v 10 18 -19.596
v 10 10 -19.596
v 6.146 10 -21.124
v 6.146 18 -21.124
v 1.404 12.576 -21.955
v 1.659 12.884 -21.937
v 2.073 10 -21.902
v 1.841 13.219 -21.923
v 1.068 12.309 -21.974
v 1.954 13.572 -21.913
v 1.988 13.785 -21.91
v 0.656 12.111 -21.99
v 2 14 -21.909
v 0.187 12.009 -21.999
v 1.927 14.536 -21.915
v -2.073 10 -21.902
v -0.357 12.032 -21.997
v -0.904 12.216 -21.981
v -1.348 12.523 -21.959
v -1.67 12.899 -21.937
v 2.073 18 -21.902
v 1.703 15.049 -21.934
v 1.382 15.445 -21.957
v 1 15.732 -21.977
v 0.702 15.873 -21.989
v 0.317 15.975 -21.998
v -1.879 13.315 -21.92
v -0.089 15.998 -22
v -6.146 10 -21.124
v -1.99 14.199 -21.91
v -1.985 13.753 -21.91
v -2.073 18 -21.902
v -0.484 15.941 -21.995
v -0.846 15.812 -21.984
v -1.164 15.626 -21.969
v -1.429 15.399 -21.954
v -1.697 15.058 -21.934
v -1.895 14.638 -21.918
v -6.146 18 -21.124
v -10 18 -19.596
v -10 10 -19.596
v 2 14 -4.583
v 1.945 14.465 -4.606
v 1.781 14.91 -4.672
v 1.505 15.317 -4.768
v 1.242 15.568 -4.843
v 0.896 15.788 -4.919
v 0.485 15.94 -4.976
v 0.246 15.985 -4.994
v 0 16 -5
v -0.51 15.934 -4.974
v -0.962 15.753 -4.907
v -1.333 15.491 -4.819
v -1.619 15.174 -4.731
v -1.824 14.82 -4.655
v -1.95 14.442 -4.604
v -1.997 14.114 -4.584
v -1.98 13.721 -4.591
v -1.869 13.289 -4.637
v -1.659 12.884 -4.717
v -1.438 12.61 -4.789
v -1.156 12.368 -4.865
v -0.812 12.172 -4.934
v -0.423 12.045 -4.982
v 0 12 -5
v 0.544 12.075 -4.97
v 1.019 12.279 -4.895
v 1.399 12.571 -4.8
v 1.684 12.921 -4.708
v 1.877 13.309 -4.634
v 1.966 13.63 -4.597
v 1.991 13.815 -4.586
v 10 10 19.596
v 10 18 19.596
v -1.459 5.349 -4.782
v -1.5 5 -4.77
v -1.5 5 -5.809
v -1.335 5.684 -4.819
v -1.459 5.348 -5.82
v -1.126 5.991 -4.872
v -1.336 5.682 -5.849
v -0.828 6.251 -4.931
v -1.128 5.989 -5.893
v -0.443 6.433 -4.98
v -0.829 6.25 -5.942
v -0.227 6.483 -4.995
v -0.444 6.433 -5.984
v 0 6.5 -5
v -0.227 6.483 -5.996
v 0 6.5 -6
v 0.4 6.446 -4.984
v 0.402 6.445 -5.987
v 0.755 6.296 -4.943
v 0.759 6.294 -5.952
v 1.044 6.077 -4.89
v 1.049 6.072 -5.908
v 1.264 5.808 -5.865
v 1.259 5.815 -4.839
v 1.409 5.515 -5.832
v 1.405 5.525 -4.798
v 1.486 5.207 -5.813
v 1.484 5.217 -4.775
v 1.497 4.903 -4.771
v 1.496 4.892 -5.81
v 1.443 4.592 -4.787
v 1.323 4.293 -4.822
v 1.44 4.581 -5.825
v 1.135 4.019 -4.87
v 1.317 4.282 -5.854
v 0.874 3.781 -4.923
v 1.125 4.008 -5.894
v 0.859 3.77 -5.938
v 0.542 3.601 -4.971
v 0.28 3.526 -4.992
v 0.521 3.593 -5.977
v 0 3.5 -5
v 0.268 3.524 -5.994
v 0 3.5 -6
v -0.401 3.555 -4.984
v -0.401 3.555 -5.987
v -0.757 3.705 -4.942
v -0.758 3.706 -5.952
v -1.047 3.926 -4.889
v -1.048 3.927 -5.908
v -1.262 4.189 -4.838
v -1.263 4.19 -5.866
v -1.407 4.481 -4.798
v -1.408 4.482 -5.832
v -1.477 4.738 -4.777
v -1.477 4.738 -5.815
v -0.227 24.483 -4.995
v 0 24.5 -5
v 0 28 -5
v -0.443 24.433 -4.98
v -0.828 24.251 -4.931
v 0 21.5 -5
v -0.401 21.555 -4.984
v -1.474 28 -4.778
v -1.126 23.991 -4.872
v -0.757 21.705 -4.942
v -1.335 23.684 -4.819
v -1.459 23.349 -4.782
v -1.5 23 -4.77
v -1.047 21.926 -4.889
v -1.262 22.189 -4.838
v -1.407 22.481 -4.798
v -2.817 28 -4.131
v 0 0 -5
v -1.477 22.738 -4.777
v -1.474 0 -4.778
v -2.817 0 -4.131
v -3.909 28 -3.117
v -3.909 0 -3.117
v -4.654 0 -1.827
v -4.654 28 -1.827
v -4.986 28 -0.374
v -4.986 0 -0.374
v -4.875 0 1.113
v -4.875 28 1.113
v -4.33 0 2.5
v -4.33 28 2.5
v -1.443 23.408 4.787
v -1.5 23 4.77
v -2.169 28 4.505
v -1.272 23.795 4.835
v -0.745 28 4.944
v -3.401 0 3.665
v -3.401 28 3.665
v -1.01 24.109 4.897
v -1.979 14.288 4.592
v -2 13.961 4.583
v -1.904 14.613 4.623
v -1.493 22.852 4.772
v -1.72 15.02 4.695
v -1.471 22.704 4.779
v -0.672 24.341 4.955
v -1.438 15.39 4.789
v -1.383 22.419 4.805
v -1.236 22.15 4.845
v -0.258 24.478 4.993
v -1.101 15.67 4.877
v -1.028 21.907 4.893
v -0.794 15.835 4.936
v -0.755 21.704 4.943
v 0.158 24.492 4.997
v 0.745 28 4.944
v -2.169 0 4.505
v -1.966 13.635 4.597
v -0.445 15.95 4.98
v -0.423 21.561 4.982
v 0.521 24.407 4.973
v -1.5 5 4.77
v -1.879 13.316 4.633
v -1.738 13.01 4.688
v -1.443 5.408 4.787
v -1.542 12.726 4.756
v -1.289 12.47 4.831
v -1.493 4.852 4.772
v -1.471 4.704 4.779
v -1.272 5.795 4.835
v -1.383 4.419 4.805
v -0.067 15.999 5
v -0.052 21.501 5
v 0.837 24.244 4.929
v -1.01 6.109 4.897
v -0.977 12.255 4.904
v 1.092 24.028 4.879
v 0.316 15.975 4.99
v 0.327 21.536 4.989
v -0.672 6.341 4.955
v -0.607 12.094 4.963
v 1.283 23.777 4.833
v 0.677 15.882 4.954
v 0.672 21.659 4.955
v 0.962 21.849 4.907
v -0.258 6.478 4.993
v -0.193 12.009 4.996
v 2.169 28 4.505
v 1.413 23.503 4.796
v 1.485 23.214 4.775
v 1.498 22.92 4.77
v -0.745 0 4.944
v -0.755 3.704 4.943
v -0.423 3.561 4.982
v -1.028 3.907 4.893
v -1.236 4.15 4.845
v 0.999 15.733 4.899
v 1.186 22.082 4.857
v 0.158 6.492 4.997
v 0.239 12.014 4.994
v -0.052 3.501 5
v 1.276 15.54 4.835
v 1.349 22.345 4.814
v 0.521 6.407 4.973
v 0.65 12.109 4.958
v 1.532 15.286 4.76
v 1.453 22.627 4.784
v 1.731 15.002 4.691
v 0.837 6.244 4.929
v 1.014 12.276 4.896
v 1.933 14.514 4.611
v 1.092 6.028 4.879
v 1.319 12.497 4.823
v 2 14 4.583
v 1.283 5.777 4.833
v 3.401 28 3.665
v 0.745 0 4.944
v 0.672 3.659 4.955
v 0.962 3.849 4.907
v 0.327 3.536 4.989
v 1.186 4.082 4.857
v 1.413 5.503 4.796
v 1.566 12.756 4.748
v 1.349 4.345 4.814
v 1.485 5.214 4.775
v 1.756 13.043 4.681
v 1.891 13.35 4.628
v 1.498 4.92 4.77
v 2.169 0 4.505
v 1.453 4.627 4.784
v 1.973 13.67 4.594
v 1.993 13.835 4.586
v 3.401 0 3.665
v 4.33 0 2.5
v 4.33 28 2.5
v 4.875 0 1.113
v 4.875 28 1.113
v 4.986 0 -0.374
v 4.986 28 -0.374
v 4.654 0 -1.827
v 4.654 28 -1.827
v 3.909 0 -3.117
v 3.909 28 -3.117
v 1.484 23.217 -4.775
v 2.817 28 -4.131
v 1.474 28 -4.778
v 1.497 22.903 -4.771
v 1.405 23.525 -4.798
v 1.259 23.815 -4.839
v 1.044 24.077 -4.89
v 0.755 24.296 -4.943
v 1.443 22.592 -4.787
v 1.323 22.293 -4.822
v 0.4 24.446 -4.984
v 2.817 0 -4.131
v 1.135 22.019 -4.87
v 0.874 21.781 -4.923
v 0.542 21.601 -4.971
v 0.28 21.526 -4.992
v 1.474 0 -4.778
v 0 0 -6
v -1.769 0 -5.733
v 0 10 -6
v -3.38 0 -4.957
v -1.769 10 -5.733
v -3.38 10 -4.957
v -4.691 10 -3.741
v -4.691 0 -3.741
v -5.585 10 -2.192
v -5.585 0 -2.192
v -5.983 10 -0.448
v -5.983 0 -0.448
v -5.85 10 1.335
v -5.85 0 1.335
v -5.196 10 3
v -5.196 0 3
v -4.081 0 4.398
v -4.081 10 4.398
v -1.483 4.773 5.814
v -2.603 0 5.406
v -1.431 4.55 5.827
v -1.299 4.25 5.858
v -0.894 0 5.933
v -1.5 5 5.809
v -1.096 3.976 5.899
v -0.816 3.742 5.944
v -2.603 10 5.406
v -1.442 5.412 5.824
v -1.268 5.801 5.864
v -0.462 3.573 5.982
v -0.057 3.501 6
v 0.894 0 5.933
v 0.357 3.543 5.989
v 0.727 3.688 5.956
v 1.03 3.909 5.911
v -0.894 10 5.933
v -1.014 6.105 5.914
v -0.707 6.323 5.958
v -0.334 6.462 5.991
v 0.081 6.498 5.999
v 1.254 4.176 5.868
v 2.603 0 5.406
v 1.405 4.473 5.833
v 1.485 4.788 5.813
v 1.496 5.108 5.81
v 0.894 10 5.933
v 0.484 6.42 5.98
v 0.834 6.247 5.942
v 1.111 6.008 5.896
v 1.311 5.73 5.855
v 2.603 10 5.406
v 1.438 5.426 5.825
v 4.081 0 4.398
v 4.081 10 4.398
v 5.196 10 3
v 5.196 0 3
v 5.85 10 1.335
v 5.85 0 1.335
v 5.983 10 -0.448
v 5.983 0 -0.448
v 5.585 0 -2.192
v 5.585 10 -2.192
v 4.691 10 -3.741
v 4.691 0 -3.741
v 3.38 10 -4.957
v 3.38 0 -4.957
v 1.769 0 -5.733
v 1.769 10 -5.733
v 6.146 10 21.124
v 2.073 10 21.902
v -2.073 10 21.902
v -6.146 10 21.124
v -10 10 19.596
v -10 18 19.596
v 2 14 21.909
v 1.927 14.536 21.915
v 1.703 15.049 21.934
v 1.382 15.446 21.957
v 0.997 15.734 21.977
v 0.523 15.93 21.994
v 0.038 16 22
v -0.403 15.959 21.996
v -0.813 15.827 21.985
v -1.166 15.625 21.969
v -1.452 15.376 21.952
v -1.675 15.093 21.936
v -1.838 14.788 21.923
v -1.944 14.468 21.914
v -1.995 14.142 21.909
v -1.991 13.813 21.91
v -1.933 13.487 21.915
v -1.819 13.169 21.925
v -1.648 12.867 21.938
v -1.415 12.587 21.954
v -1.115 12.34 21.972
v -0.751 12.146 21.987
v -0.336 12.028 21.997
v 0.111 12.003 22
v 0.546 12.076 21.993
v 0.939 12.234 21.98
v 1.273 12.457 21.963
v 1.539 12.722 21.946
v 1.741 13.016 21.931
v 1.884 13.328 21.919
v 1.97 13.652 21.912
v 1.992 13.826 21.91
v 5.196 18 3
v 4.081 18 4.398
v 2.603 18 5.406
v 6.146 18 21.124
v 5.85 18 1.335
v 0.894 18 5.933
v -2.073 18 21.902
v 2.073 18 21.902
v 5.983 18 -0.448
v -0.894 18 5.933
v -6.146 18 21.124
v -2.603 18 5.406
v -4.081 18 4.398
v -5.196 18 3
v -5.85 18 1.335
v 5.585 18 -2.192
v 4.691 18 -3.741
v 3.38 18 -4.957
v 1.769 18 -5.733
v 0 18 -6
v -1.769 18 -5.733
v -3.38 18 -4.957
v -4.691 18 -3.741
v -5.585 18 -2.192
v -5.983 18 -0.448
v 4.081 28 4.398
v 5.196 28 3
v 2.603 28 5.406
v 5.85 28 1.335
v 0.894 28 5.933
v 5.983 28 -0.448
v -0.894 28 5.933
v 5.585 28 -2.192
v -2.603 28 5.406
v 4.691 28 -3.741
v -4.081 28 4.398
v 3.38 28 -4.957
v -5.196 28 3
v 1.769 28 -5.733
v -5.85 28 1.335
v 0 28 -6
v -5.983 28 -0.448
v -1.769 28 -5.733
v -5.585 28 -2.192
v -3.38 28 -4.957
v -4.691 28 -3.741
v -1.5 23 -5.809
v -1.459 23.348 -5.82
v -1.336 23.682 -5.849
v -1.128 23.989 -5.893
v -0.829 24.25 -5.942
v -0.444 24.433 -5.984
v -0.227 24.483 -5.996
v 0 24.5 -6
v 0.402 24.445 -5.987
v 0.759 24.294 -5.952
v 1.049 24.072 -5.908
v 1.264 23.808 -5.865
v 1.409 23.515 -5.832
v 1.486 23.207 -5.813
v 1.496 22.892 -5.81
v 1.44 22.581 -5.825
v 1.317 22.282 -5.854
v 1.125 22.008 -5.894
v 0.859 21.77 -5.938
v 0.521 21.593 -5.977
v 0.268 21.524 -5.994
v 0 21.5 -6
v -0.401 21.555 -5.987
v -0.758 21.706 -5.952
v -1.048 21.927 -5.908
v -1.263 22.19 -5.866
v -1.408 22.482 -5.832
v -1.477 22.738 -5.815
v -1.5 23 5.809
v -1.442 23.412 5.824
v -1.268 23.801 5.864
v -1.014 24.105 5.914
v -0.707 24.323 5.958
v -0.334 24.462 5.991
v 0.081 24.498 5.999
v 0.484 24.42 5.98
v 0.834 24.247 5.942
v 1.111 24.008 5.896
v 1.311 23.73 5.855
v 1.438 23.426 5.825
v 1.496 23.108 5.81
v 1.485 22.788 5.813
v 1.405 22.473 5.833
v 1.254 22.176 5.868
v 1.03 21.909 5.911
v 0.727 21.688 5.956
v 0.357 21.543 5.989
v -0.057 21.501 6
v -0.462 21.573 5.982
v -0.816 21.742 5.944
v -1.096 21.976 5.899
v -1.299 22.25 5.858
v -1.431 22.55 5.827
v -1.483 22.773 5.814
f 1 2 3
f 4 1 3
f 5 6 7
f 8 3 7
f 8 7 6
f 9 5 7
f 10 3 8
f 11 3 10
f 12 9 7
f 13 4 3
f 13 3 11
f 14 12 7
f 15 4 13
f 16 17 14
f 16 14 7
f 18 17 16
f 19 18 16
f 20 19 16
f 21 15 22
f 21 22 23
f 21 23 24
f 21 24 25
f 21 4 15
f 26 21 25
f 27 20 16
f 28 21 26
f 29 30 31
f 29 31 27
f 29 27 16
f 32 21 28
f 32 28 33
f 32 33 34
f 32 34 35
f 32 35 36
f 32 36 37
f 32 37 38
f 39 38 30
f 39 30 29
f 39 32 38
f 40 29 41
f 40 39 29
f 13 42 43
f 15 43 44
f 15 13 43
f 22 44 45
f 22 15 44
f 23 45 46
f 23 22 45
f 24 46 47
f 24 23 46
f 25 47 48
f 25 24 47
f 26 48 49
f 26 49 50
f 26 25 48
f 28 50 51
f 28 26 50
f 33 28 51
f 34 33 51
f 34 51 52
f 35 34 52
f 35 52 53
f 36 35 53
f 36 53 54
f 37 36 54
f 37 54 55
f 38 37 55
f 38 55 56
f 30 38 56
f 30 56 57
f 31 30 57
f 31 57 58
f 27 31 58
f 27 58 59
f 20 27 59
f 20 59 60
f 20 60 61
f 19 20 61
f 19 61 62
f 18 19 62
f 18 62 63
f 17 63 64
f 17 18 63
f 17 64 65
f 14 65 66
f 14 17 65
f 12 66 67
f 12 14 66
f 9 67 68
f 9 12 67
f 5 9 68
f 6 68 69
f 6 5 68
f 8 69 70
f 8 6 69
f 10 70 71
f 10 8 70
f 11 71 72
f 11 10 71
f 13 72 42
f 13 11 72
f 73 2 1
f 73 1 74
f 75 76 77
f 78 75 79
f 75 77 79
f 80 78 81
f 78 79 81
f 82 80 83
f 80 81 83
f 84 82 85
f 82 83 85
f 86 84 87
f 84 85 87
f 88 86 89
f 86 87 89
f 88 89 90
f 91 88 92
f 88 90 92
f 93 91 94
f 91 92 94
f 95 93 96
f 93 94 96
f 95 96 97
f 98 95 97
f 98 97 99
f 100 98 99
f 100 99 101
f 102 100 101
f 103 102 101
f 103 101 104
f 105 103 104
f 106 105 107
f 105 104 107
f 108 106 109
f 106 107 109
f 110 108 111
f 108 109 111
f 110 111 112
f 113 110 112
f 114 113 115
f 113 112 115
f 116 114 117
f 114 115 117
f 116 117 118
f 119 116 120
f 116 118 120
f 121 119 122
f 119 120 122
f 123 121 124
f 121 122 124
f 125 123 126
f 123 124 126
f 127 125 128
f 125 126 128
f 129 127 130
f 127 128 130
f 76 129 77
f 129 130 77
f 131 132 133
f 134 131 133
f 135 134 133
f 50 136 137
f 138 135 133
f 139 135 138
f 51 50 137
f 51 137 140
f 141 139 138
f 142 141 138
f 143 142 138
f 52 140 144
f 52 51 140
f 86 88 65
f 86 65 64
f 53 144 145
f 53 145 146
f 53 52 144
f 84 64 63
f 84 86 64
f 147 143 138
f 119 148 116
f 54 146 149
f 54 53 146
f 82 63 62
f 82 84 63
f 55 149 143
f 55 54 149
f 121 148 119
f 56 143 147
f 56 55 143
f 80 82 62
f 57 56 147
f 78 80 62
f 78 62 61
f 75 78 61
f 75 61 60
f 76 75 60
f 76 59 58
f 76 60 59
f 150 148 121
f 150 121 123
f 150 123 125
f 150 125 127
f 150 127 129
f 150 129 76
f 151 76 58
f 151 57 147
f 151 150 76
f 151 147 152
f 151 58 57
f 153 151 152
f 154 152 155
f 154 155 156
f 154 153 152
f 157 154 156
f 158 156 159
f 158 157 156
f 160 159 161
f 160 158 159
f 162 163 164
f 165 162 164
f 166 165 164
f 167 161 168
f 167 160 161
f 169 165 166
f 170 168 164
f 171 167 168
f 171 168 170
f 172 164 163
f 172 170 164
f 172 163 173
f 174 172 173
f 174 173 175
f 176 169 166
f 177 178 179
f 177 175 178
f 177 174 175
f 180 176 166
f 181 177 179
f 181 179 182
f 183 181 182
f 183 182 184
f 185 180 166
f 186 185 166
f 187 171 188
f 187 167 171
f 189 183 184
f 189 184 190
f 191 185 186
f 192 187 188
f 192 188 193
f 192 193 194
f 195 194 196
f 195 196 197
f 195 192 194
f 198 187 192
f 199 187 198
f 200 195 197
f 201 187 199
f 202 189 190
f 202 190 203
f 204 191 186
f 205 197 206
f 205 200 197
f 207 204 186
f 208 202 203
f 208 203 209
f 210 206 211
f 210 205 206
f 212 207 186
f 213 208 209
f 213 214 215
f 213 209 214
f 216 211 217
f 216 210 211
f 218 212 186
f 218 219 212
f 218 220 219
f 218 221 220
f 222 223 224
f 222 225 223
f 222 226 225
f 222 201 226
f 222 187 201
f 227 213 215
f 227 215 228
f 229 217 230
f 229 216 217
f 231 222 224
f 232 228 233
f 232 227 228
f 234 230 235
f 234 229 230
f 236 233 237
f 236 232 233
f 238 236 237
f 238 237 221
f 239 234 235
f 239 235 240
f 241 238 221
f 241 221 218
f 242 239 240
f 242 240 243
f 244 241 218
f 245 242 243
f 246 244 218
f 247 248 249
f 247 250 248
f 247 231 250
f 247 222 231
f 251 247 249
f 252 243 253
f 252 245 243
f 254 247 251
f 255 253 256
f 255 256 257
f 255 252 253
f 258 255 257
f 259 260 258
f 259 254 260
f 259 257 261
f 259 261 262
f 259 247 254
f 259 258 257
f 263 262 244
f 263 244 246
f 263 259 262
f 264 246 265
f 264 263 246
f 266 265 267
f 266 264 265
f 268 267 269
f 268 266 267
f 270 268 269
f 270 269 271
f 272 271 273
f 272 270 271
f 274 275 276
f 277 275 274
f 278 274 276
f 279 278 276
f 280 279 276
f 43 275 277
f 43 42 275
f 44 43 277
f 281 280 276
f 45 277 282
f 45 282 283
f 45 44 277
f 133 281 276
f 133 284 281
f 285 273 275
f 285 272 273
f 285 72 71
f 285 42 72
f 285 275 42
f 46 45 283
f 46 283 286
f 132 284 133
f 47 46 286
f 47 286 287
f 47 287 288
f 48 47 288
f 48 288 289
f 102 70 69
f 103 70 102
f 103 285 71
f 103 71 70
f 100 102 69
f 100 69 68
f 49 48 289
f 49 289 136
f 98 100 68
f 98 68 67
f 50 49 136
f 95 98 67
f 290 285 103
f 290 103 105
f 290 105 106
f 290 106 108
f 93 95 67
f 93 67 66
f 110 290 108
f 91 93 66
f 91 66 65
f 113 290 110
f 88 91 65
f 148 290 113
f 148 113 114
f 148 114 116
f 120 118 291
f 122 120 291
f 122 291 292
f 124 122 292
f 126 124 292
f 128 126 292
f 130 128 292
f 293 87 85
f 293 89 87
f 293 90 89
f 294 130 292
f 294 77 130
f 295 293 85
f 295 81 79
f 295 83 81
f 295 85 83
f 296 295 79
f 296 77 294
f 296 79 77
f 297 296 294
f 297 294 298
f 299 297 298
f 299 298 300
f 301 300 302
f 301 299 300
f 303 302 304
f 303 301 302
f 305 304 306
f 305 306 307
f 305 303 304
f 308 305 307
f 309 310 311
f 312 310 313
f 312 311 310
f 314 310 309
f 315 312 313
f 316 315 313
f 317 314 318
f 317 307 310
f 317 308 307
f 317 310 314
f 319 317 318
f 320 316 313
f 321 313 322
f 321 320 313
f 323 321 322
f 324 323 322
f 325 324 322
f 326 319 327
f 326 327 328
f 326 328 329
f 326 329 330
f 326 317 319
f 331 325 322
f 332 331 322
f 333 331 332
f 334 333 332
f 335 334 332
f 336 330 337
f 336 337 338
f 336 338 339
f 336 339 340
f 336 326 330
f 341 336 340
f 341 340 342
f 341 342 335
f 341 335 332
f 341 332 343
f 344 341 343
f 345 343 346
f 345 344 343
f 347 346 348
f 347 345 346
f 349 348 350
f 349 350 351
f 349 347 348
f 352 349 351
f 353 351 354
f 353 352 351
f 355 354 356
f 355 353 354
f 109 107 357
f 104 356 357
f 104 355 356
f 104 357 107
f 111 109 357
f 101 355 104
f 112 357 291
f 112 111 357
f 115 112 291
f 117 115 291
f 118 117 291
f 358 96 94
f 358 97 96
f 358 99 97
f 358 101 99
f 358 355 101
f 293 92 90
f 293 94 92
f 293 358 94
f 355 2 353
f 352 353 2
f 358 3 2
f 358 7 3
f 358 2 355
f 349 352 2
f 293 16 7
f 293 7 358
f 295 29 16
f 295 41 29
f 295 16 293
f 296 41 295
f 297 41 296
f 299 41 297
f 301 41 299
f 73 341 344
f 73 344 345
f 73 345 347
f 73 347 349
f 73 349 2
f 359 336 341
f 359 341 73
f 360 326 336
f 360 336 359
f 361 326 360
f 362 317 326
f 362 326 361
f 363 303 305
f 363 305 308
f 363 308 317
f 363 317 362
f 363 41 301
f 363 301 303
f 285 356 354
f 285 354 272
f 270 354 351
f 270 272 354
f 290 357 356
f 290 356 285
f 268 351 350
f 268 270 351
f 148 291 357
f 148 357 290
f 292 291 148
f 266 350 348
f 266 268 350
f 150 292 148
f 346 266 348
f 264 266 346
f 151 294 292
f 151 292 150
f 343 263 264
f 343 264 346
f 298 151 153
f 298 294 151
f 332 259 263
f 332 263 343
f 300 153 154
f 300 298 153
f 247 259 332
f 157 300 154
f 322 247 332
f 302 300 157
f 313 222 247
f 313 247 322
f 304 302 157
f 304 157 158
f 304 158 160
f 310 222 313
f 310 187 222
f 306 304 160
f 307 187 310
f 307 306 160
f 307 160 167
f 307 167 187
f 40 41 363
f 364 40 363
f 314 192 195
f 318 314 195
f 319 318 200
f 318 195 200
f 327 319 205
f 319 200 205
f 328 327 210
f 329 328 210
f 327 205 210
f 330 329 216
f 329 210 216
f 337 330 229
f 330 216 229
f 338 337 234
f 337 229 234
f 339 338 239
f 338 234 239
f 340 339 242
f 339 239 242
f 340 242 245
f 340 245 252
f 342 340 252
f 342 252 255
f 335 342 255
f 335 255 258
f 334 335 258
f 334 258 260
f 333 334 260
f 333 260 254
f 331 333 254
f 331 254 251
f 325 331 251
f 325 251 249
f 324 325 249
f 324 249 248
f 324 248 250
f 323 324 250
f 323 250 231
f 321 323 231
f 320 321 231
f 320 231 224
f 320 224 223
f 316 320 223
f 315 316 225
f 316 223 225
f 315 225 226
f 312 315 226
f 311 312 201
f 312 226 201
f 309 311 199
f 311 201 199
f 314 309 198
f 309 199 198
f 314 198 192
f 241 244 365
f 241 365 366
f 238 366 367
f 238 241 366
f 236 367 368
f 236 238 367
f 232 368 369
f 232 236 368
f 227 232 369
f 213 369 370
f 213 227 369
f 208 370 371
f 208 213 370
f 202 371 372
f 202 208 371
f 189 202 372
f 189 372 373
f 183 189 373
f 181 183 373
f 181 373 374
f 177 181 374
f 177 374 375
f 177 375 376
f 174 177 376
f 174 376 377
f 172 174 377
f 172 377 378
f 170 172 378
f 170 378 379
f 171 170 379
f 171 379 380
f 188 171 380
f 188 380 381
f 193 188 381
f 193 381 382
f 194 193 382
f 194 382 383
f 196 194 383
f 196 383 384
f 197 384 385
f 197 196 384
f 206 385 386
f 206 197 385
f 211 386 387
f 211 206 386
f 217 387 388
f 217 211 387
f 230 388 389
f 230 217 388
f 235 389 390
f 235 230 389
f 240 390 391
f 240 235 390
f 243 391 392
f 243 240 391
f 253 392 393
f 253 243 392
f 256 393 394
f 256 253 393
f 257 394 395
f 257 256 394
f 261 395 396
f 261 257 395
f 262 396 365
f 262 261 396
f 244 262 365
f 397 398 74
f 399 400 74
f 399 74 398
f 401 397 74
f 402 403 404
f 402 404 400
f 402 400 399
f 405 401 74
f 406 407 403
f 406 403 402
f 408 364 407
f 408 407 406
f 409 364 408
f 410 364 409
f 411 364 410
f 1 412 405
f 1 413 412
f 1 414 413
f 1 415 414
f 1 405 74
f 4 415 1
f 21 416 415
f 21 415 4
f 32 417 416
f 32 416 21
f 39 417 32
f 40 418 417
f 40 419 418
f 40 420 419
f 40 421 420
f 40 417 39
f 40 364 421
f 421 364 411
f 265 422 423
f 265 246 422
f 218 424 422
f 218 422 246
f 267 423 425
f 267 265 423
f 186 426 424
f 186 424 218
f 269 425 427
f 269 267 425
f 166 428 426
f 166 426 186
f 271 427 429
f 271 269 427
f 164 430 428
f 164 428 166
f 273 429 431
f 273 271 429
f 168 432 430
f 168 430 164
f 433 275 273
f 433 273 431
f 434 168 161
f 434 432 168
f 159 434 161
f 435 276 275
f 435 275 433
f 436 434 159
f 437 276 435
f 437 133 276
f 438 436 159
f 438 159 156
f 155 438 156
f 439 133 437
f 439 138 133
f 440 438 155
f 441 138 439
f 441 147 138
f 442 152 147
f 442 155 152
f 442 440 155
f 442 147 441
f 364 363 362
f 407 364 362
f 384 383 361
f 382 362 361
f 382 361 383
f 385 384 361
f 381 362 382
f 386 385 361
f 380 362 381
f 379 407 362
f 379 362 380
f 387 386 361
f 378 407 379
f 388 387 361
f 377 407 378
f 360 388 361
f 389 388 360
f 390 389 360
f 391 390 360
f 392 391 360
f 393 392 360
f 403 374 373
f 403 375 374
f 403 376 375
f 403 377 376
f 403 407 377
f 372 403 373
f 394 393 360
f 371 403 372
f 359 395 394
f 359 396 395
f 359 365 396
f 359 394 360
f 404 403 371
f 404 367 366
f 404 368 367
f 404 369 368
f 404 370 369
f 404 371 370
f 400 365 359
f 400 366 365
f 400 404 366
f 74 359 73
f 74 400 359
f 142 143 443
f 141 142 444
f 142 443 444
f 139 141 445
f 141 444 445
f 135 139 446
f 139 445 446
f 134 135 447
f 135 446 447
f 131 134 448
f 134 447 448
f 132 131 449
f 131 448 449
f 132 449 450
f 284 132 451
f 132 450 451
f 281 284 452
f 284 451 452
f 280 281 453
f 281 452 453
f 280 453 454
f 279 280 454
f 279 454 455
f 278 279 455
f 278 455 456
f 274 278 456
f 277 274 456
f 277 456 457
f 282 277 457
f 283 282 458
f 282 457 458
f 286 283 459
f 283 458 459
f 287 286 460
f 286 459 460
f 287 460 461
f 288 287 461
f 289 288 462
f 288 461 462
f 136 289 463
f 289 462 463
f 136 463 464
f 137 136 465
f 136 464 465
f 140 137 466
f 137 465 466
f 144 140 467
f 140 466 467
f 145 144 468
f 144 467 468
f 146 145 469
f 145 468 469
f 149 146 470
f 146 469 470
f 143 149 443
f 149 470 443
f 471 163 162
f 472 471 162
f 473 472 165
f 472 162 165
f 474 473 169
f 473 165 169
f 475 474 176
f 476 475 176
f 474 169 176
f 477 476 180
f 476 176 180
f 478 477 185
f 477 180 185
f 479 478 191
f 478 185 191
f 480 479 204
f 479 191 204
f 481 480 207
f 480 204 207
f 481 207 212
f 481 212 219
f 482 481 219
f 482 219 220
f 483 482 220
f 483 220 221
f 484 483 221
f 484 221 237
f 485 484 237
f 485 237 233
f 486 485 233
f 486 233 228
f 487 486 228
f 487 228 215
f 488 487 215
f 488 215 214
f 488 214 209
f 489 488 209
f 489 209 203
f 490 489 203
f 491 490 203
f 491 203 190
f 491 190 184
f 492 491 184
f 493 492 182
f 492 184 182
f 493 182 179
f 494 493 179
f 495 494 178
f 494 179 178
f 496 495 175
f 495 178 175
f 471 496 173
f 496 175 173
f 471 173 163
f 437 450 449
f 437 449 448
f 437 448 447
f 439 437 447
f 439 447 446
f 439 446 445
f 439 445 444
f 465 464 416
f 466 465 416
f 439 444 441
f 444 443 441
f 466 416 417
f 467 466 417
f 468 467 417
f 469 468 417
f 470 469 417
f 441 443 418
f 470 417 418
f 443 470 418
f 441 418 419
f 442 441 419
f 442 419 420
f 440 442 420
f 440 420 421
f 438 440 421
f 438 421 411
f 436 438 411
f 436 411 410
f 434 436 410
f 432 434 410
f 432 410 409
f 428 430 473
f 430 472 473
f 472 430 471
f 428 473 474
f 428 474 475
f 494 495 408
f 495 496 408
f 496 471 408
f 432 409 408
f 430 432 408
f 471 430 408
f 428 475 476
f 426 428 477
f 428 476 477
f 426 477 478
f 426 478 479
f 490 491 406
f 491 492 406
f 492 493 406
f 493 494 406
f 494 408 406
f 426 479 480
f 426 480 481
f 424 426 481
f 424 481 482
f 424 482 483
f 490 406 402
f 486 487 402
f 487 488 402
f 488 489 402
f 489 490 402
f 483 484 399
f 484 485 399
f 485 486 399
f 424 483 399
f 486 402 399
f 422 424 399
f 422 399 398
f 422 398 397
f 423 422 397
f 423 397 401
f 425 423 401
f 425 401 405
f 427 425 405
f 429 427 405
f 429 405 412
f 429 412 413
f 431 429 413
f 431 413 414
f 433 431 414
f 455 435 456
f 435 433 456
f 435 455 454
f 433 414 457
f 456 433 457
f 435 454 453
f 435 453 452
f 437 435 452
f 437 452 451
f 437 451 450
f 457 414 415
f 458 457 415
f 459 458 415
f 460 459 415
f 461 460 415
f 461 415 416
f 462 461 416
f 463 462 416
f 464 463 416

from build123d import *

# Parameters (mm, degrees)
SKETCH2_R               = 6
SKETCH2_R_2             = 5
BOSS_EXTRUDE1_DEPTH     = 10
SKETCH3_R               = 1.5
CUT_EXTRUDE1_DEPTH      = 46.299006612
CUT_EXTRUDE2_DEPTH      = 42.85689914
CUT_EXTRUDE2_DEPTH_BACK = 42.85689914
SKETCH4_R               = 2
SKETCH5_W               = 20
SKETCH5_H               = 45
CUT_EXTRUDE3_DEPTH      = 10


with BuildPart() as part:
    # Sketch1 → Revolve1 (revolve)
    with BuildSketch(Plane.XY, mode=Mode.PRIVATE) as revolve1_sk:
        Polygon((5, 0), (6, 0), (6, 10), (22, 10), (22, 18), (5, 18), (5, 13), align=None)
    revolve(revolve1_sk.sketch.rotate(Axis((0, 0, 0), (0, 1, 0)), 90), axis=Axis((0, 0, 0), (0, 1, 0)))

    # Sketch2 → Boss-Extrude1 (add)
    with BuildSketch(Plane(origin=(0, 18, 0), x_dir=(1, 0, 0), z_dir=(0, 1, 0))):
        with Locations(Location((0, 0, 0), (0, 0, 90))):
            Circle(SKETCH2_R)
        with Locations(Location((0, 0, 0), (0, 0, 90))):
            Circle(SKETCH2_R_2, mode=Mode.SUBTRACT)
    extrude(amount=BOSS_EXTRUDE1_DEPTH)

    # Sketch3 → Cut-Extrude1 (cut, through all)
    with BuildSketch(Plane(origin=(0, 0, -6), x_dir=(-1, 0, 0), z_dir=(0, 0, -1))):
        with Locations((0, 5)):
            Circle(SKETCH3_R)
        with Locations((0, 23)):
            Circle(SKETCH3_R)
    extrude(amount=-CUT_EXTRUDE1_DEPTH, mode=Mode.SUBTRACT)

    # Sketch4 → Cut-Extrude2 (cut, two sides: drawn at the far end of the back side and taken through both)
    with BuildSketch(Plane.XY.offset(-CUT_EXTRUDE2_DEPTH_BACK)):
        with Locations((0, 14)):
            Circle(SKETCH4_R)
    extrude(amount=CUT_EXTRUDE2_DEPTH + CUT_EXTRUDE2_DEPTH_BACK, mode=Mode.SUBTRACT)

    # Sketch5 → Cut-Extrude3 (cut)
    with BuildSketch(Plane.XZ.offset(-10)):
        with Locations((-20, 0)):
            Rectangle(SKETCH5_W, SKETCH5_H)
        with Locations((20, 0)):
            Rectangle(SKETCH5_W, SKETCH5_H)
    extrude(amount=-CUT_EXTRUDE3_DEPTH, mode=Mode.SUBTRACT)


solid = part.part
